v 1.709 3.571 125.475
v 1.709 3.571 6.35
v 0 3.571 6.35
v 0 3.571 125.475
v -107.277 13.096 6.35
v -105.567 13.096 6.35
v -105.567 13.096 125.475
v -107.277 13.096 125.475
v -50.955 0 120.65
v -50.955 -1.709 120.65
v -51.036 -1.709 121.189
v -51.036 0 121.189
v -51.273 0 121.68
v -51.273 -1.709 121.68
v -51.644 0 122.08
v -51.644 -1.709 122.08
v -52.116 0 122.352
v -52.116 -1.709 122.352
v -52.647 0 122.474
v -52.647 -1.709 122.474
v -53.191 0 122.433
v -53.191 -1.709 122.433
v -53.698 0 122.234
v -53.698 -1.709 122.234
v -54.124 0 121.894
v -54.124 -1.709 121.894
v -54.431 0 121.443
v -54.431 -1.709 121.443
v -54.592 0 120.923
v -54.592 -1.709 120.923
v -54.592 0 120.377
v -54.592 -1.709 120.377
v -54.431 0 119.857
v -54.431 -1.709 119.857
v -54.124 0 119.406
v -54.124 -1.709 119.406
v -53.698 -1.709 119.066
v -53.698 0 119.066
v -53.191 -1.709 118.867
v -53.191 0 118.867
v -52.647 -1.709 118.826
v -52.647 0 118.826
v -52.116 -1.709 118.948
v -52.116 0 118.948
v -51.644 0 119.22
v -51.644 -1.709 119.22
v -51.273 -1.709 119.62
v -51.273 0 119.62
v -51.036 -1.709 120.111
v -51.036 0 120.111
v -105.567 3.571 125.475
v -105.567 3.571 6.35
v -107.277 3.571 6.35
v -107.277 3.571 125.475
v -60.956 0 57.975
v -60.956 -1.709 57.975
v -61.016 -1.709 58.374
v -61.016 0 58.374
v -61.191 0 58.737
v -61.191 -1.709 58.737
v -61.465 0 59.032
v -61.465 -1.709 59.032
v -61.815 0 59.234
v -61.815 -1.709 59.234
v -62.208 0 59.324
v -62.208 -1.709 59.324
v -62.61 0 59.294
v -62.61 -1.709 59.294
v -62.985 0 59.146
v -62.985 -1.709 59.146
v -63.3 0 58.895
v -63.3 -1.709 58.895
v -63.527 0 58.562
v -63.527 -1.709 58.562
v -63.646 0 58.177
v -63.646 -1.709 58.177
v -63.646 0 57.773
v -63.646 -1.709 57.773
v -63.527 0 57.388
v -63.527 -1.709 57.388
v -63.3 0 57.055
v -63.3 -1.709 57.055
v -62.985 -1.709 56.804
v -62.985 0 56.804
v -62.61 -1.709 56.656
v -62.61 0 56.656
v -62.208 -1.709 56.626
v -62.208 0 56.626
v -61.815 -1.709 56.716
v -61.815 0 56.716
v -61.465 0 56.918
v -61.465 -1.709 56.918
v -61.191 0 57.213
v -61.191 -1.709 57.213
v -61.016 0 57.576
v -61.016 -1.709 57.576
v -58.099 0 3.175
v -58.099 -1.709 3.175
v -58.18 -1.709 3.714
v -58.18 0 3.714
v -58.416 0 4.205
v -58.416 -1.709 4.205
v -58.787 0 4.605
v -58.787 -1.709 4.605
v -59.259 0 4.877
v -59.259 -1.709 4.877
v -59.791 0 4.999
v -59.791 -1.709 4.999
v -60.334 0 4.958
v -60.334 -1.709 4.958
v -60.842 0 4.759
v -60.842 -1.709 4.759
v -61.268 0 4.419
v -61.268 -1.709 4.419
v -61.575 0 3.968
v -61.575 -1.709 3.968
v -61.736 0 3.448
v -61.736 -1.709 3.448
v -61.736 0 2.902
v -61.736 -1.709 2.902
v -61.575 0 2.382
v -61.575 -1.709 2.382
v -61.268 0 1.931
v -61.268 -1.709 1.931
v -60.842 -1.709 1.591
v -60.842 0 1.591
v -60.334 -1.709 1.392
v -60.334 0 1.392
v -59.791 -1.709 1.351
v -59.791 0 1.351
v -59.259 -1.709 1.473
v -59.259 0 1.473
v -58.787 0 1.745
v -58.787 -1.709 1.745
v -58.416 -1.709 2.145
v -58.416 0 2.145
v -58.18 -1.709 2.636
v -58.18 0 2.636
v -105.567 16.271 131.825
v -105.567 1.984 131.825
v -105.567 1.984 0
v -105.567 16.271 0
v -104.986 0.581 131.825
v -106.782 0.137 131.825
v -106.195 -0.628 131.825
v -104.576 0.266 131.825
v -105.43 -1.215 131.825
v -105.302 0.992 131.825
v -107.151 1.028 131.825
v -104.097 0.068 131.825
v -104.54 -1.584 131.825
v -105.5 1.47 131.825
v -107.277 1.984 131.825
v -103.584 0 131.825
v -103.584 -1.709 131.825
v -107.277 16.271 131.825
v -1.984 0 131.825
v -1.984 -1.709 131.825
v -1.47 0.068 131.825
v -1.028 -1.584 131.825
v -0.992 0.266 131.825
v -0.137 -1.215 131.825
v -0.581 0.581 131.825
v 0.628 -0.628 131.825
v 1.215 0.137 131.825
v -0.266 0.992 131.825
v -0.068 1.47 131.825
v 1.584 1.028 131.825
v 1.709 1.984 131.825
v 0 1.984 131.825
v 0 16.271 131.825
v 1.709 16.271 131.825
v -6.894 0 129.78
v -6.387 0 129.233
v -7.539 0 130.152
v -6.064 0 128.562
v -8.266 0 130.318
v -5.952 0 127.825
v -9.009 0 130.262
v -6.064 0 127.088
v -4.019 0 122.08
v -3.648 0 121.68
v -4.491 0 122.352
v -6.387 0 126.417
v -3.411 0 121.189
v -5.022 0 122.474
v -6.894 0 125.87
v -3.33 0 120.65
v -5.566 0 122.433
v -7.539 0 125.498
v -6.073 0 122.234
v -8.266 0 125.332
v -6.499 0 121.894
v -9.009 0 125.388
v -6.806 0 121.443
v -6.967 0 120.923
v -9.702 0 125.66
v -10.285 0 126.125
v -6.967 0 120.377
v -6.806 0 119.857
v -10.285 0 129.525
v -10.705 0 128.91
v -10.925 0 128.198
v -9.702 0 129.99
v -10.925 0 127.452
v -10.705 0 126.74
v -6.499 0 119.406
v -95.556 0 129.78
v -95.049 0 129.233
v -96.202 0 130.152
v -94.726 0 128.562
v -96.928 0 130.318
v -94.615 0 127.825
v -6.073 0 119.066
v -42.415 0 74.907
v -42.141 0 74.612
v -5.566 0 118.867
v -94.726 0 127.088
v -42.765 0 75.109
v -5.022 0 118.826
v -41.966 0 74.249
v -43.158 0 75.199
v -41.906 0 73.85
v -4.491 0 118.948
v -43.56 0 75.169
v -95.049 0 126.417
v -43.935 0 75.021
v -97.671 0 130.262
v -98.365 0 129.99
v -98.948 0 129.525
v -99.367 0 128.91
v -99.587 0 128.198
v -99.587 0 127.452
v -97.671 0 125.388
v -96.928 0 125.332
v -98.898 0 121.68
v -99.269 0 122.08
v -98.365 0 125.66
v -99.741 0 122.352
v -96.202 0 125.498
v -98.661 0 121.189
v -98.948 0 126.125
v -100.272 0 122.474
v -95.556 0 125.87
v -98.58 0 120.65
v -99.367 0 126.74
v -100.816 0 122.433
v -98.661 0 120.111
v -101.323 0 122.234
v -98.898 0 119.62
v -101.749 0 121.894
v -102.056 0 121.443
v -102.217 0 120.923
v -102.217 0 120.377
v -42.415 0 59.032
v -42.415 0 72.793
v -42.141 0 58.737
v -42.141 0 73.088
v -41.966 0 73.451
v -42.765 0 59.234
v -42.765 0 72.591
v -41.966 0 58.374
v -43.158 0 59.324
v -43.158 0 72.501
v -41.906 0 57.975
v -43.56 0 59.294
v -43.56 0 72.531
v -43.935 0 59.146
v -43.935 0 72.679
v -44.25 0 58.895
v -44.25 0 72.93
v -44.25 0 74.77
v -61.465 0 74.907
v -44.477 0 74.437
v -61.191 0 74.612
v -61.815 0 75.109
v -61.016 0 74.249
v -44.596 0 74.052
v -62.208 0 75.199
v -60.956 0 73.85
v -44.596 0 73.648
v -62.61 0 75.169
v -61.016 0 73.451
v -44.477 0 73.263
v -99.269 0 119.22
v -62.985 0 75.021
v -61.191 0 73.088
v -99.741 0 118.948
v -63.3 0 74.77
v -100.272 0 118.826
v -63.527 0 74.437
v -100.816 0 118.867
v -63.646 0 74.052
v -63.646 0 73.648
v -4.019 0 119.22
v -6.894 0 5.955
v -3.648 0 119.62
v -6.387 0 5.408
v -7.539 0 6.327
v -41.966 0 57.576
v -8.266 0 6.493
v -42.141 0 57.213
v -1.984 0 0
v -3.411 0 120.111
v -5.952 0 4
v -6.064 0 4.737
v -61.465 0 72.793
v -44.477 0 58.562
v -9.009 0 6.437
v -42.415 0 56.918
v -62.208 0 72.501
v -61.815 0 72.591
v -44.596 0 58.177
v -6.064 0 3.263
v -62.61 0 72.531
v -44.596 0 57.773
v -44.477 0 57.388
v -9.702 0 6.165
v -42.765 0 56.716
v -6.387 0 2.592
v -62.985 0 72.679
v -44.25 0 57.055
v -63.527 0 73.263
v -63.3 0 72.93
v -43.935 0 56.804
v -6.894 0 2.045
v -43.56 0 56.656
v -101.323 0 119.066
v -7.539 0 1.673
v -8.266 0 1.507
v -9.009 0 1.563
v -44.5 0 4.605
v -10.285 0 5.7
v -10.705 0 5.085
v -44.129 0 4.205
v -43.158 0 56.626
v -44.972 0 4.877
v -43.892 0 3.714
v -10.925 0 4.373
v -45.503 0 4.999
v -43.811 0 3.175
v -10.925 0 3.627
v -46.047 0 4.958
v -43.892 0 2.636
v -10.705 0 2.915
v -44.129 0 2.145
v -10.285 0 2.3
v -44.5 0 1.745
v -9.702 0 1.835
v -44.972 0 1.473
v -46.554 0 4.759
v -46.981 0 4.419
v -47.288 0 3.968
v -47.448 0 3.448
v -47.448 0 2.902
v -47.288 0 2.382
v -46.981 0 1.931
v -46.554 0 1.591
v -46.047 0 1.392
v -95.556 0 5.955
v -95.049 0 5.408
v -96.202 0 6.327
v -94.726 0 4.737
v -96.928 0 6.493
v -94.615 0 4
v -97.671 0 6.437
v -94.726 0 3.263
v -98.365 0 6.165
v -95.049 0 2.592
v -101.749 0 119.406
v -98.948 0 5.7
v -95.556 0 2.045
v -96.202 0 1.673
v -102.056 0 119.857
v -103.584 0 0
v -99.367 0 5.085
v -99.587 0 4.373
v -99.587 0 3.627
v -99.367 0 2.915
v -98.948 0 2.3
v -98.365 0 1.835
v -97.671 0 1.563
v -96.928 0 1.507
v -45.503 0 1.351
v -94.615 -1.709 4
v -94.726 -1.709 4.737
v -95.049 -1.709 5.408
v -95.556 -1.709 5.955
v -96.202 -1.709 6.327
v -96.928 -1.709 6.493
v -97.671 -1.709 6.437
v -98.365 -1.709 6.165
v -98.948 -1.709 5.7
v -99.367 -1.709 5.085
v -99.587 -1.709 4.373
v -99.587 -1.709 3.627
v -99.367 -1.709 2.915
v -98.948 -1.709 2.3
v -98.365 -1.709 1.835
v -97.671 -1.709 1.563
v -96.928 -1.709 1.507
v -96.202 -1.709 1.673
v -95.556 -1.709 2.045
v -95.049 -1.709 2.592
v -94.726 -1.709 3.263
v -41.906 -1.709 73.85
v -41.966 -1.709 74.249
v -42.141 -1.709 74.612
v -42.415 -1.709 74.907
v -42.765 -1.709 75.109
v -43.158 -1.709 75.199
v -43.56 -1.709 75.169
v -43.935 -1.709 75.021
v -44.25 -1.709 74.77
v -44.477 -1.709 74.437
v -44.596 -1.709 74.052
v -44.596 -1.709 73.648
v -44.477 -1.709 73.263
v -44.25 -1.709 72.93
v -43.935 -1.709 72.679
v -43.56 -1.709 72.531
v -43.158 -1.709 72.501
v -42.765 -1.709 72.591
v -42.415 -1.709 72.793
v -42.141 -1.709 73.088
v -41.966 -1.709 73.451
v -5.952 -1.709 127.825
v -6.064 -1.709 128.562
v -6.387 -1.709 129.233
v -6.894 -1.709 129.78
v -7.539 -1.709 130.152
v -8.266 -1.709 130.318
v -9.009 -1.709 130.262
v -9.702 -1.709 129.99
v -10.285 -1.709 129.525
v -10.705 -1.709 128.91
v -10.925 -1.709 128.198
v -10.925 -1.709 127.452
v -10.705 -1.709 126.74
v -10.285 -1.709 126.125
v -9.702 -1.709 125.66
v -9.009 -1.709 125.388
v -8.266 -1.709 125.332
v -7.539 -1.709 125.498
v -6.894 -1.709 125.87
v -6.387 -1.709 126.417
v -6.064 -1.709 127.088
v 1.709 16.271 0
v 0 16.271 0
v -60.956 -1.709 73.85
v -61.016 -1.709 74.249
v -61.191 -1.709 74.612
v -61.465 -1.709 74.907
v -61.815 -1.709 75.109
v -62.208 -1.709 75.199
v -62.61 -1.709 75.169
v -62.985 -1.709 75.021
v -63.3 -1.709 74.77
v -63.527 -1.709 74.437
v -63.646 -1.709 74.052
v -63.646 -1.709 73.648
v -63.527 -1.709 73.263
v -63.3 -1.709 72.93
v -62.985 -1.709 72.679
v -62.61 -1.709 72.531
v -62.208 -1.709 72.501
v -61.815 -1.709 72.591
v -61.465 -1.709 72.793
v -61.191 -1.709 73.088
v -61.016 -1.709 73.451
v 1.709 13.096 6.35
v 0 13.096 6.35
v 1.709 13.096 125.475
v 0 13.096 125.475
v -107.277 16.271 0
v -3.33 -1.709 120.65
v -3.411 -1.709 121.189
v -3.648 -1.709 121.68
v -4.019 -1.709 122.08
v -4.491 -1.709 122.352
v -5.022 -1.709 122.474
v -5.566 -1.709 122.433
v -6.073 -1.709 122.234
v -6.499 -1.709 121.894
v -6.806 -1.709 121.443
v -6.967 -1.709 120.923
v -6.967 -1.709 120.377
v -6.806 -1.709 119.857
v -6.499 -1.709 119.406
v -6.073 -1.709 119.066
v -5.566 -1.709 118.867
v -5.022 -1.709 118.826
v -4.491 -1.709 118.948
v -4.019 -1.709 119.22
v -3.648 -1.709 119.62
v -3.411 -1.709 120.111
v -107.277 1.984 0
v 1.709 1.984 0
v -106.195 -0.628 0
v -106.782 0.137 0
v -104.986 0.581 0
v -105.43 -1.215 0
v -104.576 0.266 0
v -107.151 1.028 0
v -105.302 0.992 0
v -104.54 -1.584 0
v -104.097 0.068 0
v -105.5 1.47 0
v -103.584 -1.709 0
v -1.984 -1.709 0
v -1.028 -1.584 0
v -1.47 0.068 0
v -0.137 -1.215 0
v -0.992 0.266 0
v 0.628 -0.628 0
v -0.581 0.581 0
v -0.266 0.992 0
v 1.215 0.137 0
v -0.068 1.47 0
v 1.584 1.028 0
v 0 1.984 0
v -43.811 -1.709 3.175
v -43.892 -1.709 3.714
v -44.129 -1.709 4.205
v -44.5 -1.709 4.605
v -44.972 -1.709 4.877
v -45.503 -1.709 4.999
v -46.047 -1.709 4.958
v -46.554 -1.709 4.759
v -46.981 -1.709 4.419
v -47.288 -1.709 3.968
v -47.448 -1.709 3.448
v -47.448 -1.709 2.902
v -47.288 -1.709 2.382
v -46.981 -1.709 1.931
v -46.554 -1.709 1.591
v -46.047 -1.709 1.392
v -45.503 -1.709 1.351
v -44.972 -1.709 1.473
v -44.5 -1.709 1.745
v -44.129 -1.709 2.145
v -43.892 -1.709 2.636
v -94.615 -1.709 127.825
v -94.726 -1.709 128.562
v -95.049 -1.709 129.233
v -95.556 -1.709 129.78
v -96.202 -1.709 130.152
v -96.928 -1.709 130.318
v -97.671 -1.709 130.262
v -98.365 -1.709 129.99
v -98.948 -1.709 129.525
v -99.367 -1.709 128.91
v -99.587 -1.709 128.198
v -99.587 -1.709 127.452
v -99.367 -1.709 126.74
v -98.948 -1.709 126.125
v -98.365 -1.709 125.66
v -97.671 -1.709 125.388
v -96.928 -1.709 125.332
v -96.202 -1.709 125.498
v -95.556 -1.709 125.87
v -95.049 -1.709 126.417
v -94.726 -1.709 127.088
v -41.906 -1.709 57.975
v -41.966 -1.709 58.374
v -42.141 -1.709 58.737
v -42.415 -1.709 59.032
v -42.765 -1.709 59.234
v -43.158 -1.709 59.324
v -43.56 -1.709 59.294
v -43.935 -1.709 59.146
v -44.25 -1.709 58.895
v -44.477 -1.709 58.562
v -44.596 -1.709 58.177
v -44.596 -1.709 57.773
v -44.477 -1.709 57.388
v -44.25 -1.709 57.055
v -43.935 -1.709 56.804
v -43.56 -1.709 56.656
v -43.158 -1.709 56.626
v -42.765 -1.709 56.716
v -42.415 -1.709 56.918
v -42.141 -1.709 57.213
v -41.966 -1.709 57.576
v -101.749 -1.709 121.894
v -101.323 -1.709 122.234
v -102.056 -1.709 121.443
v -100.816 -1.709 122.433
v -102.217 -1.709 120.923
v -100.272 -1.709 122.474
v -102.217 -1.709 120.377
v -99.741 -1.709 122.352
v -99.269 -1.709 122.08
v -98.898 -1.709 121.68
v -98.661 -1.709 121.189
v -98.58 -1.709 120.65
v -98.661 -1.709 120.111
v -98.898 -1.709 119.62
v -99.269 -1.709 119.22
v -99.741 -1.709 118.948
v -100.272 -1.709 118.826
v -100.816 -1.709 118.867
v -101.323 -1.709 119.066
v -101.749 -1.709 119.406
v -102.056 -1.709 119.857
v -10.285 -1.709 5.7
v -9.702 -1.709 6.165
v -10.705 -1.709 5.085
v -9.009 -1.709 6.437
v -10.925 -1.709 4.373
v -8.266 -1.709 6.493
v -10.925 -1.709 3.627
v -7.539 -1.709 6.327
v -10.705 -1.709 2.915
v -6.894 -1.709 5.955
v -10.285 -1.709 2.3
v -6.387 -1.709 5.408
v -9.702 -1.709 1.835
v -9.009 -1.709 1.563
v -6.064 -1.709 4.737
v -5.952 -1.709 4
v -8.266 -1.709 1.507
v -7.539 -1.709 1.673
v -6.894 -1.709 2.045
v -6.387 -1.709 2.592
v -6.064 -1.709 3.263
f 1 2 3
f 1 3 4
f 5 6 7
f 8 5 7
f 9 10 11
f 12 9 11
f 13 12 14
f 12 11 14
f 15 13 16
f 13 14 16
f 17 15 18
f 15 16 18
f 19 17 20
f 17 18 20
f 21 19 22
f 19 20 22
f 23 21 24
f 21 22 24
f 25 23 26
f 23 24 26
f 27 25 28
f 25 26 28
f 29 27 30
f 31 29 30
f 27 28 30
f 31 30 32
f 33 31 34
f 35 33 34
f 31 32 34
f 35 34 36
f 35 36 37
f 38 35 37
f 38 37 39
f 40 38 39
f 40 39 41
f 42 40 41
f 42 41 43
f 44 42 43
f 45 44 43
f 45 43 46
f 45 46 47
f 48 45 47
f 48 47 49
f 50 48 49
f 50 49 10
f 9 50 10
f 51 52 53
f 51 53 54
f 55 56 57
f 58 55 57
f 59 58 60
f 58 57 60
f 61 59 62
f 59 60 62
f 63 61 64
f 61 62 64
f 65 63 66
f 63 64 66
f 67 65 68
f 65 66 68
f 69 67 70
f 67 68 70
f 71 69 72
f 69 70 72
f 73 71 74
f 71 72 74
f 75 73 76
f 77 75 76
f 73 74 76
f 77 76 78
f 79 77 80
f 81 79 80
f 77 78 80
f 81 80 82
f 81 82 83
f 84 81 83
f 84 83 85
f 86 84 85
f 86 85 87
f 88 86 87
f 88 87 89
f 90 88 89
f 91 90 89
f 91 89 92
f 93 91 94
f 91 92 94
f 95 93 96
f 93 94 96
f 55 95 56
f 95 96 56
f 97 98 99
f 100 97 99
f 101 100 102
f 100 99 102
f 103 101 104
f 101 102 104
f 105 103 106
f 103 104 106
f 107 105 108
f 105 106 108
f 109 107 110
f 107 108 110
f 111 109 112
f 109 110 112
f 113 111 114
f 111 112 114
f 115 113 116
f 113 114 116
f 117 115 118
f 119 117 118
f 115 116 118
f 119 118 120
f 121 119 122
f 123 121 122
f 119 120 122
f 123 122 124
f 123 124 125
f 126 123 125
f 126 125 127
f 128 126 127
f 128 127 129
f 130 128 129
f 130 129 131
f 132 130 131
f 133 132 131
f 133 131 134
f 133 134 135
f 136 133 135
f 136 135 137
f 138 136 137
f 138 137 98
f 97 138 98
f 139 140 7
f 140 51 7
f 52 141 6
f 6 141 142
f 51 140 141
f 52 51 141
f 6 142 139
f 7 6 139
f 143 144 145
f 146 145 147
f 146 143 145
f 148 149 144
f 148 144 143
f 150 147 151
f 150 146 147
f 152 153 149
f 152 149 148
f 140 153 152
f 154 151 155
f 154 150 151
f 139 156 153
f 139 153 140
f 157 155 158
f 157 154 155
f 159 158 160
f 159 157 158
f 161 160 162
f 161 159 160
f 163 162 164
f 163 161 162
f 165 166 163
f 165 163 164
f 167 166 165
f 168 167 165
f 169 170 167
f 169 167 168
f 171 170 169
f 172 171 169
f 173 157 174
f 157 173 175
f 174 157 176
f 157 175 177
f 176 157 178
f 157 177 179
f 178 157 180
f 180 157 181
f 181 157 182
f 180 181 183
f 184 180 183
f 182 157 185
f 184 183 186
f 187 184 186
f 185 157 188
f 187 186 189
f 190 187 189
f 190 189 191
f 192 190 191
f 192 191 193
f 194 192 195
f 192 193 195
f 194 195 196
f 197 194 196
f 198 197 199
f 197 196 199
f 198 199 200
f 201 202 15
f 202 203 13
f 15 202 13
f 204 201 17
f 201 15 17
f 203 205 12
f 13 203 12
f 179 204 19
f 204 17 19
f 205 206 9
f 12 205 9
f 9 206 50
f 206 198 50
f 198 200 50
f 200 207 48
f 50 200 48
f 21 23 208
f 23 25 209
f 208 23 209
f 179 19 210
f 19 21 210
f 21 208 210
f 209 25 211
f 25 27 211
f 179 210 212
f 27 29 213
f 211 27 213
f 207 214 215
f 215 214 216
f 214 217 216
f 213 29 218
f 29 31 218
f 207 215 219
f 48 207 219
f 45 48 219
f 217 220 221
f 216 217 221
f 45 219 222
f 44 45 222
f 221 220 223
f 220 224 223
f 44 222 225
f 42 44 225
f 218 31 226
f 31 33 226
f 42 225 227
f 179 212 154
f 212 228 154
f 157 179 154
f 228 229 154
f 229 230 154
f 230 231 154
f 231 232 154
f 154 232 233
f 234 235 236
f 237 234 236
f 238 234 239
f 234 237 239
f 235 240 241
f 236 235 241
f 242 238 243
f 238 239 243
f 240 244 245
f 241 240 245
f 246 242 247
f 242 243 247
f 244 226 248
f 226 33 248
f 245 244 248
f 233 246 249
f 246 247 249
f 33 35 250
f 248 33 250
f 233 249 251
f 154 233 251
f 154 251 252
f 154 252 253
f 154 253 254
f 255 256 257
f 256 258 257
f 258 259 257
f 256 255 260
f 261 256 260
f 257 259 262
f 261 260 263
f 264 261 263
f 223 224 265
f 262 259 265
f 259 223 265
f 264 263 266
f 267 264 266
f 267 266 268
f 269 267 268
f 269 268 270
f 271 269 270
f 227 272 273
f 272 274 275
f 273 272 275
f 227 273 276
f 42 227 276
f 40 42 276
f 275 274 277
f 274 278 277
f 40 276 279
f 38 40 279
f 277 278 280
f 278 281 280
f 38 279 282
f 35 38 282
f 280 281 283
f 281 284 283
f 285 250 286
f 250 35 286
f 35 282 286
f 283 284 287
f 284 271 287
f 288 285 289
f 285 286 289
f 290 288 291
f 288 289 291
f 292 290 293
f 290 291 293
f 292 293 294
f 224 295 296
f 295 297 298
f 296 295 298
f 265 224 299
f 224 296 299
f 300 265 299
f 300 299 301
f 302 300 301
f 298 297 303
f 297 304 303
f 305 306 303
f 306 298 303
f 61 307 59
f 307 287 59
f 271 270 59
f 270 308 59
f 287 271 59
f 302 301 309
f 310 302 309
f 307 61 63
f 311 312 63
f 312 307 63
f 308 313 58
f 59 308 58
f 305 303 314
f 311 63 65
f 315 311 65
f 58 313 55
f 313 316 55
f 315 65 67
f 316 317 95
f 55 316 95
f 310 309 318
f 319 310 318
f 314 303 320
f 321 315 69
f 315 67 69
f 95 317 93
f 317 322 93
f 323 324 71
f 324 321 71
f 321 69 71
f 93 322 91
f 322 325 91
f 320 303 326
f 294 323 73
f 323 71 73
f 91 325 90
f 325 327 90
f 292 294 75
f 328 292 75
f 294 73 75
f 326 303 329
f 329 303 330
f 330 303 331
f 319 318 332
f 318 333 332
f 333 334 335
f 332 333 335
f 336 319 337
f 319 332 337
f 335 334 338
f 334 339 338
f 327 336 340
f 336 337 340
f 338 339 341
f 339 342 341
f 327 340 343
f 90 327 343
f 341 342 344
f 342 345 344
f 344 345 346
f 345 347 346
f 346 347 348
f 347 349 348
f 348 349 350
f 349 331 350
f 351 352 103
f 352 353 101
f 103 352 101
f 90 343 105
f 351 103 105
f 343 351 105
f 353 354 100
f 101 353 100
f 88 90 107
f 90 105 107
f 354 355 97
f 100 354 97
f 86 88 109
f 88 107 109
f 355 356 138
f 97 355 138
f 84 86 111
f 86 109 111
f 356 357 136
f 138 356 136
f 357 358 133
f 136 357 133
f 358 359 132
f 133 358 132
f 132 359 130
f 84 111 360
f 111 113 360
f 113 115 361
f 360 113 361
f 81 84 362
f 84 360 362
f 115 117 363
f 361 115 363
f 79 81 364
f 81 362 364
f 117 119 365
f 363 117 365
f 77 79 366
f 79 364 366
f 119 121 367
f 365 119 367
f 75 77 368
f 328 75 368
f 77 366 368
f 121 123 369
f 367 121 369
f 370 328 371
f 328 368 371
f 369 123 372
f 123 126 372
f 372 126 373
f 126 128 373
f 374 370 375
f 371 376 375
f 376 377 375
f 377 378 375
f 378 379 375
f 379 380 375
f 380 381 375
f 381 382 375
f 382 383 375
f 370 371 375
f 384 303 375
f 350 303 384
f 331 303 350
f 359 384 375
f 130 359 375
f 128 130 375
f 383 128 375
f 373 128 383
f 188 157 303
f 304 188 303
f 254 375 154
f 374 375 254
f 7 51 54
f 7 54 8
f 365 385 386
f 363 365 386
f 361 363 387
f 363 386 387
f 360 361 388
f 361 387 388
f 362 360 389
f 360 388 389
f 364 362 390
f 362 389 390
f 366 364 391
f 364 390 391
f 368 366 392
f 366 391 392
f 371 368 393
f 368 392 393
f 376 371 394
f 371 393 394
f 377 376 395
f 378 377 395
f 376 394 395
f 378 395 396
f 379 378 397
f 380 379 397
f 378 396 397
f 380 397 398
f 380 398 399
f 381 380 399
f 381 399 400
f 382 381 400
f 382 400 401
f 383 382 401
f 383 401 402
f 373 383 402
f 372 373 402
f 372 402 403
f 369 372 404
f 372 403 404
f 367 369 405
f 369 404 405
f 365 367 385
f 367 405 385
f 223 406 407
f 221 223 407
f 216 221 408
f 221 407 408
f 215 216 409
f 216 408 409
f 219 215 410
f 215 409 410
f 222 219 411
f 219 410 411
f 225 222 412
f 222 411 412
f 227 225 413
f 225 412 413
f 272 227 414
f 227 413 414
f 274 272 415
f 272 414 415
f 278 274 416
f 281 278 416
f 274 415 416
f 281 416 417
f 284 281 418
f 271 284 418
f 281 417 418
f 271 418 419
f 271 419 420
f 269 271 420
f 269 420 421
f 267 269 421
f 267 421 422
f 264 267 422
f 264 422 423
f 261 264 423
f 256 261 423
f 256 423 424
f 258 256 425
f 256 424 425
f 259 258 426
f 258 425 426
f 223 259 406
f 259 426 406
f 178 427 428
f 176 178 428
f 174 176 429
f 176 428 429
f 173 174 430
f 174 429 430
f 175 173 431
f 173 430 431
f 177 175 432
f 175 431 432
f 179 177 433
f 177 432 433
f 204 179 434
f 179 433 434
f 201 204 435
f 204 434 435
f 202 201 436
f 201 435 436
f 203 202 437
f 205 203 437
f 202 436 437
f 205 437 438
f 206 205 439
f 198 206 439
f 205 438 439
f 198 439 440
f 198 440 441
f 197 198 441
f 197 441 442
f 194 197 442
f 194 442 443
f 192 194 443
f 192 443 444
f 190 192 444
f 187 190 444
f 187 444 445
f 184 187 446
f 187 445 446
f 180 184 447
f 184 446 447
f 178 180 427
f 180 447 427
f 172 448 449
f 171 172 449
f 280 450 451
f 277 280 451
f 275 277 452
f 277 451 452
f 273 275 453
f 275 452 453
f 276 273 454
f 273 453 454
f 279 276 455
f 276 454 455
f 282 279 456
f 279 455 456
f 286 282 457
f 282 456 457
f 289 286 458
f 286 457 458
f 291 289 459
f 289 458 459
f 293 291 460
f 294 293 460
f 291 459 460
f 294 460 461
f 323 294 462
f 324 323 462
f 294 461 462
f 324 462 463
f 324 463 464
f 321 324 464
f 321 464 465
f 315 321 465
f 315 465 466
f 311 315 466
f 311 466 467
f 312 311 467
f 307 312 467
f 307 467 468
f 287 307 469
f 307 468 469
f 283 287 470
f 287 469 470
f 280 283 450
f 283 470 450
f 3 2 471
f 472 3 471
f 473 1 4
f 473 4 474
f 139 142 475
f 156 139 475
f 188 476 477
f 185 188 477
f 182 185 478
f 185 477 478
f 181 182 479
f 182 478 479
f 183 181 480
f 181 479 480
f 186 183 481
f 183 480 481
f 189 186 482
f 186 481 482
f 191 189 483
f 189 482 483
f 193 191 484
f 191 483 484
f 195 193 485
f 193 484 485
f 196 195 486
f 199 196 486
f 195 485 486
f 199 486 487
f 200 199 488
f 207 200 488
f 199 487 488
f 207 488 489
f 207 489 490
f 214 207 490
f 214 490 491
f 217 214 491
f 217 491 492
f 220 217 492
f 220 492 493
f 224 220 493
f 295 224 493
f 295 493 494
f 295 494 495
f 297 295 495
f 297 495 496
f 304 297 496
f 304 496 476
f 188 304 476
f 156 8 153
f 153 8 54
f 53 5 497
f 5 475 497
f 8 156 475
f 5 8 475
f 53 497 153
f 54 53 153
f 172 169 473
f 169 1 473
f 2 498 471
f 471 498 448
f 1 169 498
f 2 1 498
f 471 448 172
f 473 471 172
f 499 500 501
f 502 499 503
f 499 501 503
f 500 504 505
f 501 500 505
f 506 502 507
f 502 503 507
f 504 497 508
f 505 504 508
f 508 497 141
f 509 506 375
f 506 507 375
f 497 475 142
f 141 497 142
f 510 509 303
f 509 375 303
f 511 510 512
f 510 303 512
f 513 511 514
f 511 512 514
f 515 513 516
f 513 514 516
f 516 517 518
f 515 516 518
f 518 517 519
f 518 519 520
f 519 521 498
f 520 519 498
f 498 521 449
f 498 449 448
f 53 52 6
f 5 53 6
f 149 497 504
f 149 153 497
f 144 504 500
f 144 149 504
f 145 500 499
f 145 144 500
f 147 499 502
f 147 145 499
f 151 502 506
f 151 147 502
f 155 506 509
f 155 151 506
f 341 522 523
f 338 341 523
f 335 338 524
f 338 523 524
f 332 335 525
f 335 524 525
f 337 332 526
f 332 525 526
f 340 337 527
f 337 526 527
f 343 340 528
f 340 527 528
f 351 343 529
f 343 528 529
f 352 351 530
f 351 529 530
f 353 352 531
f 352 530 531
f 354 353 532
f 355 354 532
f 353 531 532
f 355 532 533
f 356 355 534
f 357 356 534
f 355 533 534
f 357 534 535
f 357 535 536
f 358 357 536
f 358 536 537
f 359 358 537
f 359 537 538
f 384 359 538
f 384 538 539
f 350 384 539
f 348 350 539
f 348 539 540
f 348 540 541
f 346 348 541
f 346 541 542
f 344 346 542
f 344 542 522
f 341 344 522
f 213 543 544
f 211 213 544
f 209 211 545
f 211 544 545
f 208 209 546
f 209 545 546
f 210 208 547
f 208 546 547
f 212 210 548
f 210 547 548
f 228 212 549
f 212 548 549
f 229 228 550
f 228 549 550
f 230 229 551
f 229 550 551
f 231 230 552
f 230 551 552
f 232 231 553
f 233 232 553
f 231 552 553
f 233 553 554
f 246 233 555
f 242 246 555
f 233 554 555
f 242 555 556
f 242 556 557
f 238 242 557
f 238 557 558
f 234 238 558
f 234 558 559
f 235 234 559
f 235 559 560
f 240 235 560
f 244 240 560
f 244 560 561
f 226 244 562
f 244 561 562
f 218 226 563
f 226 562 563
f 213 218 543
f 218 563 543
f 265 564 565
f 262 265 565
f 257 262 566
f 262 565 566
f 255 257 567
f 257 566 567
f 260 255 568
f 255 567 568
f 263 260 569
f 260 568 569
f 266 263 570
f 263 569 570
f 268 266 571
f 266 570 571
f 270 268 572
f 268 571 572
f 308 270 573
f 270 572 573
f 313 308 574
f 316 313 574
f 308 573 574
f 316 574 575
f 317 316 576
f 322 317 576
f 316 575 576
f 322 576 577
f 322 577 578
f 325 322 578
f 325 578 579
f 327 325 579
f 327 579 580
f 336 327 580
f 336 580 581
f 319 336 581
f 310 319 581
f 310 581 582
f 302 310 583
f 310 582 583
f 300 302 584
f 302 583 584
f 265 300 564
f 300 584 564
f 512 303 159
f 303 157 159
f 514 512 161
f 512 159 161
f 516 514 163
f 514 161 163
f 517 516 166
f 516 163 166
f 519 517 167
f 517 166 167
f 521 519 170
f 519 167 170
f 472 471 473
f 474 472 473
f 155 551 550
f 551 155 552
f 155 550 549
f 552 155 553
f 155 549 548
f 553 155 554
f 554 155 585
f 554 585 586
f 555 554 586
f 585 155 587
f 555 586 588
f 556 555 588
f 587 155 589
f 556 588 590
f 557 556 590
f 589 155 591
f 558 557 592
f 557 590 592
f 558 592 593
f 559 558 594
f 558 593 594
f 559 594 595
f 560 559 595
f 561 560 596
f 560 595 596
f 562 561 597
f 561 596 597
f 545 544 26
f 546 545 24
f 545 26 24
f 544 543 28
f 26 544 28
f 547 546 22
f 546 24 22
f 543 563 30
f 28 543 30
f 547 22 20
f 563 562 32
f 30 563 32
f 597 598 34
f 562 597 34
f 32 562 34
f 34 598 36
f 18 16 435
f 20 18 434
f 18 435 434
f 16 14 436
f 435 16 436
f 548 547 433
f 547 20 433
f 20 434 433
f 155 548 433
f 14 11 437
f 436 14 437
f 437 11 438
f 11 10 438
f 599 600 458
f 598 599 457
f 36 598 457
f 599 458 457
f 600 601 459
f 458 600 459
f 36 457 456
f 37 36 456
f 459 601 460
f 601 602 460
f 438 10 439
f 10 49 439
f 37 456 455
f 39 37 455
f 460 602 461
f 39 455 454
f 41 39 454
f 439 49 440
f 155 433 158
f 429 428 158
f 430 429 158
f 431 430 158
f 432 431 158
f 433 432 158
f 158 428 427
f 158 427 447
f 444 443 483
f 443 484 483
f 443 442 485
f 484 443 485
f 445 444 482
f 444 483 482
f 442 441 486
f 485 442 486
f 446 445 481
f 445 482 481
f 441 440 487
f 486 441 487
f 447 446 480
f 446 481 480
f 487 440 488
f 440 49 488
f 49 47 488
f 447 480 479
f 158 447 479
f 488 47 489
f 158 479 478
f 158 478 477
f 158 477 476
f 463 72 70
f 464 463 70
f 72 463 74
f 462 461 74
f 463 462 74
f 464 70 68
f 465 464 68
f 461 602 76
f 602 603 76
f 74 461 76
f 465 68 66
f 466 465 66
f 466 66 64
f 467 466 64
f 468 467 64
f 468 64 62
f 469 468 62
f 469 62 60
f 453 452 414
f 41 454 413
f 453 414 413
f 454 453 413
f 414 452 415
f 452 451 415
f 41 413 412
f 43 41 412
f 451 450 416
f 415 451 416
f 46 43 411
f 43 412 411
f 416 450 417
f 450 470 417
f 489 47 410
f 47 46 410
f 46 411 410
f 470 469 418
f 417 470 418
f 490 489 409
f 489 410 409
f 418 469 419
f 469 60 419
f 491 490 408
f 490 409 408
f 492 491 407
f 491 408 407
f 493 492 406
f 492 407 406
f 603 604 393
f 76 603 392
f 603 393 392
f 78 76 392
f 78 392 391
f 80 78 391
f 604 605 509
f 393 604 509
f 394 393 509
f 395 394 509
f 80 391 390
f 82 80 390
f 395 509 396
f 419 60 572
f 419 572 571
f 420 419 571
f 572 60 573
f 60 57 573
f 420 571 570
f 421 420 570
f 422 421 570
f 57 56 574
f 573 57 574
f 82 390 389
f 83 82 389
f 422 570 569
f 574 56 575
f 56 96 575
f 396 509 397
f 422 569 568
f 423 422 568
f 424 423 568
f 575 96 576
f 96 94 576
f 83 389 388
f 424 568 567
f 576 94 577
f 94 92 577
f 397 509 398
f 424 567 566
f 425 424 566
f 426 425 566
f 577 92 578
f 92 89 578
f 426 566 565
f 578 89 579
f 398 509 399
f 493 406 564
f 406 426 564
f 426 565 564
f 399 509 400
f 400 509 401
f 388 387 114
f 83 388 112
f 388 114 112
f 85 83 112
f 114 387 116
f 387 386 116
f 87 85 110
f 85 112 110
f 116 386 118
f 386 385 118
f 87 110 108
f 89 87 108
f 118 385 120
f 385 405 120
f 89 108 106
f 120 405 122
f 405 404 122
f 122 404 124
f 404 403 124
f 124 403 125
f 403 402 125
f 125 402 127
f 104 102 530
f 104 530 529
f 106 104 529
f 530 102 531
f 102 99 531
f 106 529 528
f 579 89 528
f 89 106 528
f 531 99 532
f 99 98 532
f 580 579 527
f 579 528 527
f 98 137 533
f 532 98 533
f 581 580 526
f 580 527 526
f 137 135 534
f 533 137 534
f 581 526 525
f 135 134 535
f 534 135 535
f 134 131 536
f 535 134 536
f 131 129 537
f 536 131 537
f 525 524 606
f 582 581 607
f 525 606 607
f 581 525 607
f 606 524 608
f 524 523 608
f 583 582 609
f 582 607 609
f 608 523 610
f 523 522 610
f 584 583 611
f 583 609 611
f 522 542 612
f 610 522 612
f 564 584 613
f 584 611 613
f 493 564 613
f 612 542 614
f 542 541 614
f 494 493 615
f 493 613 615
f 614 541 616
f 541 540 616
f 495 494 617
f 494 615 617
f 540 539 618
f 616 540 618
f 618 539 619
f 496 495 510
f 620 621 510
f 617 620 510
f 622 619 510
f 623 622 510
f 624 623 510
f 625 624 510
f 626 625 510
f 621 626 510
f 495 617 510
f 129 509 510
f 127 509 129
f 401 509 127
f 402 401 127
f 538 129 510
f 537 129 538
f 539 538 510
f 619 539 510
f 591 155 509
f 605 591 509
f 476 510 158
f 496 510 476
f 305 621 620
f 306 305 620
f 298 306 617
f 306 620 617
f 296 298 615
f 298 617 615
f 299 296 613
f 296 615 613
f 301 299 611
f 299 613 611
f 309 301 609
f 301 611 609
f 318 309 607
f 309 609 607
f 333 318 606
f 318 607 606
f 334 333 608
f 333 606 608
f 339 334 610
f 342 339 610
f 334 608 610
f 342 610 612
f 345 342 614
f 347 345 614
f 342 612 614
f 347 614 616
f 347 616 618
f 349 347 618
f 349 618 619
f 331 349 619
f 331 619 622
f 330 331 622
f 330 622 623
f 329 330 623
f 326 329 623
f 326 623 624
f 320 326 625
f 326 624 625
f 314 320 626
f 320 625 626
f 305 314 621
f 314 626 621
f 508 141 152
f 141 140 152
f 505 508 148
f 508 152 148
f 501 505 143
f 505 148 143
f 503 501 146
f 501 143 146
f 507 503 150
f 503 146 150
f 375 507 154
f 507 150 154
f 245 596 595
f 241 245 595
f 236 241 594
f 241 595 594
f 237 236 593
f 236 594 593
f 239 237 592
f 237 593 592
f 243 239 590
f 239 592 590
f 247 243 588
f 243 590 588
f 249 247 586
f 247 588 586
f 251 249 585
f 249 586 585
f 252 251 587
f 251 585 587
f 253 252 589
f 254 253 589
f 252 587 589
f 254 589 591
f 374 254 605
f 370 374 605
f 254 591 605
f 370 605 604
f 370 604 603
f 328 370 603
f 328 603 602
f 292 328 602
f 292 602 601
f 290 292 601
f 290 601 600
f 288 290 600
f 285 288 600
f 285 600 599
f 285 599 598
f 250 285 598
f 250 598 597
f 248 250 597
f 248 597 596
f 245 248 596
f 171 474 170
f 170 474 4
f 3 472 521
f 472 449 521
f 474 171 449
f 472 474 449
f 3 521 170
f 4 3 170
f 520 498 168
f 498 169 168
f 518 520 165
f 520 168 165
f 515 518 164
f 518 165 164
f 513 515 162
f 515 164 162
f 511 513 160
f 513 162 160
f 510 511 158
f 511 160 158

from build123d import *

# Parameters (mm, degrees)
F1_DEPTH  = 131.8250094
F2_W      = 9.525
F2_H      = 119.1250094
F3_DEPTH  = 108.98632
F4_R      = 3.69316
F5_R      = 1.98374
F6_R      = 1.8288
F7_DEPTH  = 257
F8_R      = 2.5
F9_DEPTH  = 1.70942
F10_R     = 1.35255
F11_DEPTH = 1.70942


# Not quite as in the source:
# - an extrude ends at something that could not be found from the text; its depth is read off the source's solid


with BuildPart() as f1:
    # F0 (on Top) → F1 (new body)
    with BuildSketch(Plane.XY):
        Polygon((0, 16.27124), (0, 0), (-105.56748, 0), (-105.56748, 16.27124), (-107.2769, 16.27124), (-107.2769, -1.70942), (1.70942, -1.70942), (1.70942, 16.27124), align=None)
    extrude(amount=F1_DEPTH)

    # F2 (on face) → F3 (cut, through all)
    with BuildSketch(Plane.YZ.offset(1.70942)):
        with Locations((8.33374, 65.9125047)):
            Rectangle(F2_W, F2_H)
    extrude(amount=-F3_DEPTH, mode=Mode.SUBTRACT)

    # F4
    f4_edges = [f1.edges().sort_by_distance(p)[0] for p in [
        (1.70942, -1.70942, 65.912505),
        (-107.2769, -1.70942, 65.912505),
    ]]
    fillet(f4_edges, radius=F4_R)

    # F5
    f5_edges = [f1.edges().sort_by_distance(p)[0] for p in [
        (0, 0, 65.912505),
        (-105.56748, 0, 65.912505),
    ]]
    fillet(f5_edges, radius=F5_R)

    # F6 (on face) → F7 (cut, through all)
    with BuildSketch(Plane.XZ.offset(1.70942)):
        with Locations((-52.78374, 120.65)):
            Circle(F6_R)
        with Locations((-5.15874, 120.65)):
            Circle(F6_R)
        with Locations((-100.40874, 120.65)):
            Circle(F6_R)
        with Locations((-45.63999, 3.175)):
            Circle(F6_R)
        with Locations((-59.92749, 3.175)):
            Circle(F6_R)
    extrude(amount=-F7_DEPTH, mode=Mode.SUBTRACT)

    # F8 (on face) → F9 (cut, through all)
    with BuildSketch(Plane.XZ.offset(1.70942)):
        with Locations((-8.452485, 127.8250094)):
            Circle(F8_R)
        with Locations((-8.452485, 4)):
            Circle(F8_R)
        with Locations((-97.114995, 4)):
            Circle(F8_R)
        with Locations((-97.114995, 127.8250094)):
            Circle(F8_R)
    extrude(amount=-F9_DEPTH, mode=Mode.SUBTRACT)

    # F10 (on face) → F11 (cut, through all)
    with BuildSketch(Plane.XZ.offset(1.70942)):
        with Locations((-43.25874, 57.9750047)):
            Circle(F10_R)
        with Locations((-43.25874, 73.8500047)):
            Circle(F10_R)
        with Locations((-62.30874, 57.9750047)):
            Circle(F10_R)
        with Locations((-62.30874, 73.8500047)):
            Circle(F10_R)
    extrude(amount=-F11_DEPTH, mode=Mode.SUBTRACT)


solid = f1.part
